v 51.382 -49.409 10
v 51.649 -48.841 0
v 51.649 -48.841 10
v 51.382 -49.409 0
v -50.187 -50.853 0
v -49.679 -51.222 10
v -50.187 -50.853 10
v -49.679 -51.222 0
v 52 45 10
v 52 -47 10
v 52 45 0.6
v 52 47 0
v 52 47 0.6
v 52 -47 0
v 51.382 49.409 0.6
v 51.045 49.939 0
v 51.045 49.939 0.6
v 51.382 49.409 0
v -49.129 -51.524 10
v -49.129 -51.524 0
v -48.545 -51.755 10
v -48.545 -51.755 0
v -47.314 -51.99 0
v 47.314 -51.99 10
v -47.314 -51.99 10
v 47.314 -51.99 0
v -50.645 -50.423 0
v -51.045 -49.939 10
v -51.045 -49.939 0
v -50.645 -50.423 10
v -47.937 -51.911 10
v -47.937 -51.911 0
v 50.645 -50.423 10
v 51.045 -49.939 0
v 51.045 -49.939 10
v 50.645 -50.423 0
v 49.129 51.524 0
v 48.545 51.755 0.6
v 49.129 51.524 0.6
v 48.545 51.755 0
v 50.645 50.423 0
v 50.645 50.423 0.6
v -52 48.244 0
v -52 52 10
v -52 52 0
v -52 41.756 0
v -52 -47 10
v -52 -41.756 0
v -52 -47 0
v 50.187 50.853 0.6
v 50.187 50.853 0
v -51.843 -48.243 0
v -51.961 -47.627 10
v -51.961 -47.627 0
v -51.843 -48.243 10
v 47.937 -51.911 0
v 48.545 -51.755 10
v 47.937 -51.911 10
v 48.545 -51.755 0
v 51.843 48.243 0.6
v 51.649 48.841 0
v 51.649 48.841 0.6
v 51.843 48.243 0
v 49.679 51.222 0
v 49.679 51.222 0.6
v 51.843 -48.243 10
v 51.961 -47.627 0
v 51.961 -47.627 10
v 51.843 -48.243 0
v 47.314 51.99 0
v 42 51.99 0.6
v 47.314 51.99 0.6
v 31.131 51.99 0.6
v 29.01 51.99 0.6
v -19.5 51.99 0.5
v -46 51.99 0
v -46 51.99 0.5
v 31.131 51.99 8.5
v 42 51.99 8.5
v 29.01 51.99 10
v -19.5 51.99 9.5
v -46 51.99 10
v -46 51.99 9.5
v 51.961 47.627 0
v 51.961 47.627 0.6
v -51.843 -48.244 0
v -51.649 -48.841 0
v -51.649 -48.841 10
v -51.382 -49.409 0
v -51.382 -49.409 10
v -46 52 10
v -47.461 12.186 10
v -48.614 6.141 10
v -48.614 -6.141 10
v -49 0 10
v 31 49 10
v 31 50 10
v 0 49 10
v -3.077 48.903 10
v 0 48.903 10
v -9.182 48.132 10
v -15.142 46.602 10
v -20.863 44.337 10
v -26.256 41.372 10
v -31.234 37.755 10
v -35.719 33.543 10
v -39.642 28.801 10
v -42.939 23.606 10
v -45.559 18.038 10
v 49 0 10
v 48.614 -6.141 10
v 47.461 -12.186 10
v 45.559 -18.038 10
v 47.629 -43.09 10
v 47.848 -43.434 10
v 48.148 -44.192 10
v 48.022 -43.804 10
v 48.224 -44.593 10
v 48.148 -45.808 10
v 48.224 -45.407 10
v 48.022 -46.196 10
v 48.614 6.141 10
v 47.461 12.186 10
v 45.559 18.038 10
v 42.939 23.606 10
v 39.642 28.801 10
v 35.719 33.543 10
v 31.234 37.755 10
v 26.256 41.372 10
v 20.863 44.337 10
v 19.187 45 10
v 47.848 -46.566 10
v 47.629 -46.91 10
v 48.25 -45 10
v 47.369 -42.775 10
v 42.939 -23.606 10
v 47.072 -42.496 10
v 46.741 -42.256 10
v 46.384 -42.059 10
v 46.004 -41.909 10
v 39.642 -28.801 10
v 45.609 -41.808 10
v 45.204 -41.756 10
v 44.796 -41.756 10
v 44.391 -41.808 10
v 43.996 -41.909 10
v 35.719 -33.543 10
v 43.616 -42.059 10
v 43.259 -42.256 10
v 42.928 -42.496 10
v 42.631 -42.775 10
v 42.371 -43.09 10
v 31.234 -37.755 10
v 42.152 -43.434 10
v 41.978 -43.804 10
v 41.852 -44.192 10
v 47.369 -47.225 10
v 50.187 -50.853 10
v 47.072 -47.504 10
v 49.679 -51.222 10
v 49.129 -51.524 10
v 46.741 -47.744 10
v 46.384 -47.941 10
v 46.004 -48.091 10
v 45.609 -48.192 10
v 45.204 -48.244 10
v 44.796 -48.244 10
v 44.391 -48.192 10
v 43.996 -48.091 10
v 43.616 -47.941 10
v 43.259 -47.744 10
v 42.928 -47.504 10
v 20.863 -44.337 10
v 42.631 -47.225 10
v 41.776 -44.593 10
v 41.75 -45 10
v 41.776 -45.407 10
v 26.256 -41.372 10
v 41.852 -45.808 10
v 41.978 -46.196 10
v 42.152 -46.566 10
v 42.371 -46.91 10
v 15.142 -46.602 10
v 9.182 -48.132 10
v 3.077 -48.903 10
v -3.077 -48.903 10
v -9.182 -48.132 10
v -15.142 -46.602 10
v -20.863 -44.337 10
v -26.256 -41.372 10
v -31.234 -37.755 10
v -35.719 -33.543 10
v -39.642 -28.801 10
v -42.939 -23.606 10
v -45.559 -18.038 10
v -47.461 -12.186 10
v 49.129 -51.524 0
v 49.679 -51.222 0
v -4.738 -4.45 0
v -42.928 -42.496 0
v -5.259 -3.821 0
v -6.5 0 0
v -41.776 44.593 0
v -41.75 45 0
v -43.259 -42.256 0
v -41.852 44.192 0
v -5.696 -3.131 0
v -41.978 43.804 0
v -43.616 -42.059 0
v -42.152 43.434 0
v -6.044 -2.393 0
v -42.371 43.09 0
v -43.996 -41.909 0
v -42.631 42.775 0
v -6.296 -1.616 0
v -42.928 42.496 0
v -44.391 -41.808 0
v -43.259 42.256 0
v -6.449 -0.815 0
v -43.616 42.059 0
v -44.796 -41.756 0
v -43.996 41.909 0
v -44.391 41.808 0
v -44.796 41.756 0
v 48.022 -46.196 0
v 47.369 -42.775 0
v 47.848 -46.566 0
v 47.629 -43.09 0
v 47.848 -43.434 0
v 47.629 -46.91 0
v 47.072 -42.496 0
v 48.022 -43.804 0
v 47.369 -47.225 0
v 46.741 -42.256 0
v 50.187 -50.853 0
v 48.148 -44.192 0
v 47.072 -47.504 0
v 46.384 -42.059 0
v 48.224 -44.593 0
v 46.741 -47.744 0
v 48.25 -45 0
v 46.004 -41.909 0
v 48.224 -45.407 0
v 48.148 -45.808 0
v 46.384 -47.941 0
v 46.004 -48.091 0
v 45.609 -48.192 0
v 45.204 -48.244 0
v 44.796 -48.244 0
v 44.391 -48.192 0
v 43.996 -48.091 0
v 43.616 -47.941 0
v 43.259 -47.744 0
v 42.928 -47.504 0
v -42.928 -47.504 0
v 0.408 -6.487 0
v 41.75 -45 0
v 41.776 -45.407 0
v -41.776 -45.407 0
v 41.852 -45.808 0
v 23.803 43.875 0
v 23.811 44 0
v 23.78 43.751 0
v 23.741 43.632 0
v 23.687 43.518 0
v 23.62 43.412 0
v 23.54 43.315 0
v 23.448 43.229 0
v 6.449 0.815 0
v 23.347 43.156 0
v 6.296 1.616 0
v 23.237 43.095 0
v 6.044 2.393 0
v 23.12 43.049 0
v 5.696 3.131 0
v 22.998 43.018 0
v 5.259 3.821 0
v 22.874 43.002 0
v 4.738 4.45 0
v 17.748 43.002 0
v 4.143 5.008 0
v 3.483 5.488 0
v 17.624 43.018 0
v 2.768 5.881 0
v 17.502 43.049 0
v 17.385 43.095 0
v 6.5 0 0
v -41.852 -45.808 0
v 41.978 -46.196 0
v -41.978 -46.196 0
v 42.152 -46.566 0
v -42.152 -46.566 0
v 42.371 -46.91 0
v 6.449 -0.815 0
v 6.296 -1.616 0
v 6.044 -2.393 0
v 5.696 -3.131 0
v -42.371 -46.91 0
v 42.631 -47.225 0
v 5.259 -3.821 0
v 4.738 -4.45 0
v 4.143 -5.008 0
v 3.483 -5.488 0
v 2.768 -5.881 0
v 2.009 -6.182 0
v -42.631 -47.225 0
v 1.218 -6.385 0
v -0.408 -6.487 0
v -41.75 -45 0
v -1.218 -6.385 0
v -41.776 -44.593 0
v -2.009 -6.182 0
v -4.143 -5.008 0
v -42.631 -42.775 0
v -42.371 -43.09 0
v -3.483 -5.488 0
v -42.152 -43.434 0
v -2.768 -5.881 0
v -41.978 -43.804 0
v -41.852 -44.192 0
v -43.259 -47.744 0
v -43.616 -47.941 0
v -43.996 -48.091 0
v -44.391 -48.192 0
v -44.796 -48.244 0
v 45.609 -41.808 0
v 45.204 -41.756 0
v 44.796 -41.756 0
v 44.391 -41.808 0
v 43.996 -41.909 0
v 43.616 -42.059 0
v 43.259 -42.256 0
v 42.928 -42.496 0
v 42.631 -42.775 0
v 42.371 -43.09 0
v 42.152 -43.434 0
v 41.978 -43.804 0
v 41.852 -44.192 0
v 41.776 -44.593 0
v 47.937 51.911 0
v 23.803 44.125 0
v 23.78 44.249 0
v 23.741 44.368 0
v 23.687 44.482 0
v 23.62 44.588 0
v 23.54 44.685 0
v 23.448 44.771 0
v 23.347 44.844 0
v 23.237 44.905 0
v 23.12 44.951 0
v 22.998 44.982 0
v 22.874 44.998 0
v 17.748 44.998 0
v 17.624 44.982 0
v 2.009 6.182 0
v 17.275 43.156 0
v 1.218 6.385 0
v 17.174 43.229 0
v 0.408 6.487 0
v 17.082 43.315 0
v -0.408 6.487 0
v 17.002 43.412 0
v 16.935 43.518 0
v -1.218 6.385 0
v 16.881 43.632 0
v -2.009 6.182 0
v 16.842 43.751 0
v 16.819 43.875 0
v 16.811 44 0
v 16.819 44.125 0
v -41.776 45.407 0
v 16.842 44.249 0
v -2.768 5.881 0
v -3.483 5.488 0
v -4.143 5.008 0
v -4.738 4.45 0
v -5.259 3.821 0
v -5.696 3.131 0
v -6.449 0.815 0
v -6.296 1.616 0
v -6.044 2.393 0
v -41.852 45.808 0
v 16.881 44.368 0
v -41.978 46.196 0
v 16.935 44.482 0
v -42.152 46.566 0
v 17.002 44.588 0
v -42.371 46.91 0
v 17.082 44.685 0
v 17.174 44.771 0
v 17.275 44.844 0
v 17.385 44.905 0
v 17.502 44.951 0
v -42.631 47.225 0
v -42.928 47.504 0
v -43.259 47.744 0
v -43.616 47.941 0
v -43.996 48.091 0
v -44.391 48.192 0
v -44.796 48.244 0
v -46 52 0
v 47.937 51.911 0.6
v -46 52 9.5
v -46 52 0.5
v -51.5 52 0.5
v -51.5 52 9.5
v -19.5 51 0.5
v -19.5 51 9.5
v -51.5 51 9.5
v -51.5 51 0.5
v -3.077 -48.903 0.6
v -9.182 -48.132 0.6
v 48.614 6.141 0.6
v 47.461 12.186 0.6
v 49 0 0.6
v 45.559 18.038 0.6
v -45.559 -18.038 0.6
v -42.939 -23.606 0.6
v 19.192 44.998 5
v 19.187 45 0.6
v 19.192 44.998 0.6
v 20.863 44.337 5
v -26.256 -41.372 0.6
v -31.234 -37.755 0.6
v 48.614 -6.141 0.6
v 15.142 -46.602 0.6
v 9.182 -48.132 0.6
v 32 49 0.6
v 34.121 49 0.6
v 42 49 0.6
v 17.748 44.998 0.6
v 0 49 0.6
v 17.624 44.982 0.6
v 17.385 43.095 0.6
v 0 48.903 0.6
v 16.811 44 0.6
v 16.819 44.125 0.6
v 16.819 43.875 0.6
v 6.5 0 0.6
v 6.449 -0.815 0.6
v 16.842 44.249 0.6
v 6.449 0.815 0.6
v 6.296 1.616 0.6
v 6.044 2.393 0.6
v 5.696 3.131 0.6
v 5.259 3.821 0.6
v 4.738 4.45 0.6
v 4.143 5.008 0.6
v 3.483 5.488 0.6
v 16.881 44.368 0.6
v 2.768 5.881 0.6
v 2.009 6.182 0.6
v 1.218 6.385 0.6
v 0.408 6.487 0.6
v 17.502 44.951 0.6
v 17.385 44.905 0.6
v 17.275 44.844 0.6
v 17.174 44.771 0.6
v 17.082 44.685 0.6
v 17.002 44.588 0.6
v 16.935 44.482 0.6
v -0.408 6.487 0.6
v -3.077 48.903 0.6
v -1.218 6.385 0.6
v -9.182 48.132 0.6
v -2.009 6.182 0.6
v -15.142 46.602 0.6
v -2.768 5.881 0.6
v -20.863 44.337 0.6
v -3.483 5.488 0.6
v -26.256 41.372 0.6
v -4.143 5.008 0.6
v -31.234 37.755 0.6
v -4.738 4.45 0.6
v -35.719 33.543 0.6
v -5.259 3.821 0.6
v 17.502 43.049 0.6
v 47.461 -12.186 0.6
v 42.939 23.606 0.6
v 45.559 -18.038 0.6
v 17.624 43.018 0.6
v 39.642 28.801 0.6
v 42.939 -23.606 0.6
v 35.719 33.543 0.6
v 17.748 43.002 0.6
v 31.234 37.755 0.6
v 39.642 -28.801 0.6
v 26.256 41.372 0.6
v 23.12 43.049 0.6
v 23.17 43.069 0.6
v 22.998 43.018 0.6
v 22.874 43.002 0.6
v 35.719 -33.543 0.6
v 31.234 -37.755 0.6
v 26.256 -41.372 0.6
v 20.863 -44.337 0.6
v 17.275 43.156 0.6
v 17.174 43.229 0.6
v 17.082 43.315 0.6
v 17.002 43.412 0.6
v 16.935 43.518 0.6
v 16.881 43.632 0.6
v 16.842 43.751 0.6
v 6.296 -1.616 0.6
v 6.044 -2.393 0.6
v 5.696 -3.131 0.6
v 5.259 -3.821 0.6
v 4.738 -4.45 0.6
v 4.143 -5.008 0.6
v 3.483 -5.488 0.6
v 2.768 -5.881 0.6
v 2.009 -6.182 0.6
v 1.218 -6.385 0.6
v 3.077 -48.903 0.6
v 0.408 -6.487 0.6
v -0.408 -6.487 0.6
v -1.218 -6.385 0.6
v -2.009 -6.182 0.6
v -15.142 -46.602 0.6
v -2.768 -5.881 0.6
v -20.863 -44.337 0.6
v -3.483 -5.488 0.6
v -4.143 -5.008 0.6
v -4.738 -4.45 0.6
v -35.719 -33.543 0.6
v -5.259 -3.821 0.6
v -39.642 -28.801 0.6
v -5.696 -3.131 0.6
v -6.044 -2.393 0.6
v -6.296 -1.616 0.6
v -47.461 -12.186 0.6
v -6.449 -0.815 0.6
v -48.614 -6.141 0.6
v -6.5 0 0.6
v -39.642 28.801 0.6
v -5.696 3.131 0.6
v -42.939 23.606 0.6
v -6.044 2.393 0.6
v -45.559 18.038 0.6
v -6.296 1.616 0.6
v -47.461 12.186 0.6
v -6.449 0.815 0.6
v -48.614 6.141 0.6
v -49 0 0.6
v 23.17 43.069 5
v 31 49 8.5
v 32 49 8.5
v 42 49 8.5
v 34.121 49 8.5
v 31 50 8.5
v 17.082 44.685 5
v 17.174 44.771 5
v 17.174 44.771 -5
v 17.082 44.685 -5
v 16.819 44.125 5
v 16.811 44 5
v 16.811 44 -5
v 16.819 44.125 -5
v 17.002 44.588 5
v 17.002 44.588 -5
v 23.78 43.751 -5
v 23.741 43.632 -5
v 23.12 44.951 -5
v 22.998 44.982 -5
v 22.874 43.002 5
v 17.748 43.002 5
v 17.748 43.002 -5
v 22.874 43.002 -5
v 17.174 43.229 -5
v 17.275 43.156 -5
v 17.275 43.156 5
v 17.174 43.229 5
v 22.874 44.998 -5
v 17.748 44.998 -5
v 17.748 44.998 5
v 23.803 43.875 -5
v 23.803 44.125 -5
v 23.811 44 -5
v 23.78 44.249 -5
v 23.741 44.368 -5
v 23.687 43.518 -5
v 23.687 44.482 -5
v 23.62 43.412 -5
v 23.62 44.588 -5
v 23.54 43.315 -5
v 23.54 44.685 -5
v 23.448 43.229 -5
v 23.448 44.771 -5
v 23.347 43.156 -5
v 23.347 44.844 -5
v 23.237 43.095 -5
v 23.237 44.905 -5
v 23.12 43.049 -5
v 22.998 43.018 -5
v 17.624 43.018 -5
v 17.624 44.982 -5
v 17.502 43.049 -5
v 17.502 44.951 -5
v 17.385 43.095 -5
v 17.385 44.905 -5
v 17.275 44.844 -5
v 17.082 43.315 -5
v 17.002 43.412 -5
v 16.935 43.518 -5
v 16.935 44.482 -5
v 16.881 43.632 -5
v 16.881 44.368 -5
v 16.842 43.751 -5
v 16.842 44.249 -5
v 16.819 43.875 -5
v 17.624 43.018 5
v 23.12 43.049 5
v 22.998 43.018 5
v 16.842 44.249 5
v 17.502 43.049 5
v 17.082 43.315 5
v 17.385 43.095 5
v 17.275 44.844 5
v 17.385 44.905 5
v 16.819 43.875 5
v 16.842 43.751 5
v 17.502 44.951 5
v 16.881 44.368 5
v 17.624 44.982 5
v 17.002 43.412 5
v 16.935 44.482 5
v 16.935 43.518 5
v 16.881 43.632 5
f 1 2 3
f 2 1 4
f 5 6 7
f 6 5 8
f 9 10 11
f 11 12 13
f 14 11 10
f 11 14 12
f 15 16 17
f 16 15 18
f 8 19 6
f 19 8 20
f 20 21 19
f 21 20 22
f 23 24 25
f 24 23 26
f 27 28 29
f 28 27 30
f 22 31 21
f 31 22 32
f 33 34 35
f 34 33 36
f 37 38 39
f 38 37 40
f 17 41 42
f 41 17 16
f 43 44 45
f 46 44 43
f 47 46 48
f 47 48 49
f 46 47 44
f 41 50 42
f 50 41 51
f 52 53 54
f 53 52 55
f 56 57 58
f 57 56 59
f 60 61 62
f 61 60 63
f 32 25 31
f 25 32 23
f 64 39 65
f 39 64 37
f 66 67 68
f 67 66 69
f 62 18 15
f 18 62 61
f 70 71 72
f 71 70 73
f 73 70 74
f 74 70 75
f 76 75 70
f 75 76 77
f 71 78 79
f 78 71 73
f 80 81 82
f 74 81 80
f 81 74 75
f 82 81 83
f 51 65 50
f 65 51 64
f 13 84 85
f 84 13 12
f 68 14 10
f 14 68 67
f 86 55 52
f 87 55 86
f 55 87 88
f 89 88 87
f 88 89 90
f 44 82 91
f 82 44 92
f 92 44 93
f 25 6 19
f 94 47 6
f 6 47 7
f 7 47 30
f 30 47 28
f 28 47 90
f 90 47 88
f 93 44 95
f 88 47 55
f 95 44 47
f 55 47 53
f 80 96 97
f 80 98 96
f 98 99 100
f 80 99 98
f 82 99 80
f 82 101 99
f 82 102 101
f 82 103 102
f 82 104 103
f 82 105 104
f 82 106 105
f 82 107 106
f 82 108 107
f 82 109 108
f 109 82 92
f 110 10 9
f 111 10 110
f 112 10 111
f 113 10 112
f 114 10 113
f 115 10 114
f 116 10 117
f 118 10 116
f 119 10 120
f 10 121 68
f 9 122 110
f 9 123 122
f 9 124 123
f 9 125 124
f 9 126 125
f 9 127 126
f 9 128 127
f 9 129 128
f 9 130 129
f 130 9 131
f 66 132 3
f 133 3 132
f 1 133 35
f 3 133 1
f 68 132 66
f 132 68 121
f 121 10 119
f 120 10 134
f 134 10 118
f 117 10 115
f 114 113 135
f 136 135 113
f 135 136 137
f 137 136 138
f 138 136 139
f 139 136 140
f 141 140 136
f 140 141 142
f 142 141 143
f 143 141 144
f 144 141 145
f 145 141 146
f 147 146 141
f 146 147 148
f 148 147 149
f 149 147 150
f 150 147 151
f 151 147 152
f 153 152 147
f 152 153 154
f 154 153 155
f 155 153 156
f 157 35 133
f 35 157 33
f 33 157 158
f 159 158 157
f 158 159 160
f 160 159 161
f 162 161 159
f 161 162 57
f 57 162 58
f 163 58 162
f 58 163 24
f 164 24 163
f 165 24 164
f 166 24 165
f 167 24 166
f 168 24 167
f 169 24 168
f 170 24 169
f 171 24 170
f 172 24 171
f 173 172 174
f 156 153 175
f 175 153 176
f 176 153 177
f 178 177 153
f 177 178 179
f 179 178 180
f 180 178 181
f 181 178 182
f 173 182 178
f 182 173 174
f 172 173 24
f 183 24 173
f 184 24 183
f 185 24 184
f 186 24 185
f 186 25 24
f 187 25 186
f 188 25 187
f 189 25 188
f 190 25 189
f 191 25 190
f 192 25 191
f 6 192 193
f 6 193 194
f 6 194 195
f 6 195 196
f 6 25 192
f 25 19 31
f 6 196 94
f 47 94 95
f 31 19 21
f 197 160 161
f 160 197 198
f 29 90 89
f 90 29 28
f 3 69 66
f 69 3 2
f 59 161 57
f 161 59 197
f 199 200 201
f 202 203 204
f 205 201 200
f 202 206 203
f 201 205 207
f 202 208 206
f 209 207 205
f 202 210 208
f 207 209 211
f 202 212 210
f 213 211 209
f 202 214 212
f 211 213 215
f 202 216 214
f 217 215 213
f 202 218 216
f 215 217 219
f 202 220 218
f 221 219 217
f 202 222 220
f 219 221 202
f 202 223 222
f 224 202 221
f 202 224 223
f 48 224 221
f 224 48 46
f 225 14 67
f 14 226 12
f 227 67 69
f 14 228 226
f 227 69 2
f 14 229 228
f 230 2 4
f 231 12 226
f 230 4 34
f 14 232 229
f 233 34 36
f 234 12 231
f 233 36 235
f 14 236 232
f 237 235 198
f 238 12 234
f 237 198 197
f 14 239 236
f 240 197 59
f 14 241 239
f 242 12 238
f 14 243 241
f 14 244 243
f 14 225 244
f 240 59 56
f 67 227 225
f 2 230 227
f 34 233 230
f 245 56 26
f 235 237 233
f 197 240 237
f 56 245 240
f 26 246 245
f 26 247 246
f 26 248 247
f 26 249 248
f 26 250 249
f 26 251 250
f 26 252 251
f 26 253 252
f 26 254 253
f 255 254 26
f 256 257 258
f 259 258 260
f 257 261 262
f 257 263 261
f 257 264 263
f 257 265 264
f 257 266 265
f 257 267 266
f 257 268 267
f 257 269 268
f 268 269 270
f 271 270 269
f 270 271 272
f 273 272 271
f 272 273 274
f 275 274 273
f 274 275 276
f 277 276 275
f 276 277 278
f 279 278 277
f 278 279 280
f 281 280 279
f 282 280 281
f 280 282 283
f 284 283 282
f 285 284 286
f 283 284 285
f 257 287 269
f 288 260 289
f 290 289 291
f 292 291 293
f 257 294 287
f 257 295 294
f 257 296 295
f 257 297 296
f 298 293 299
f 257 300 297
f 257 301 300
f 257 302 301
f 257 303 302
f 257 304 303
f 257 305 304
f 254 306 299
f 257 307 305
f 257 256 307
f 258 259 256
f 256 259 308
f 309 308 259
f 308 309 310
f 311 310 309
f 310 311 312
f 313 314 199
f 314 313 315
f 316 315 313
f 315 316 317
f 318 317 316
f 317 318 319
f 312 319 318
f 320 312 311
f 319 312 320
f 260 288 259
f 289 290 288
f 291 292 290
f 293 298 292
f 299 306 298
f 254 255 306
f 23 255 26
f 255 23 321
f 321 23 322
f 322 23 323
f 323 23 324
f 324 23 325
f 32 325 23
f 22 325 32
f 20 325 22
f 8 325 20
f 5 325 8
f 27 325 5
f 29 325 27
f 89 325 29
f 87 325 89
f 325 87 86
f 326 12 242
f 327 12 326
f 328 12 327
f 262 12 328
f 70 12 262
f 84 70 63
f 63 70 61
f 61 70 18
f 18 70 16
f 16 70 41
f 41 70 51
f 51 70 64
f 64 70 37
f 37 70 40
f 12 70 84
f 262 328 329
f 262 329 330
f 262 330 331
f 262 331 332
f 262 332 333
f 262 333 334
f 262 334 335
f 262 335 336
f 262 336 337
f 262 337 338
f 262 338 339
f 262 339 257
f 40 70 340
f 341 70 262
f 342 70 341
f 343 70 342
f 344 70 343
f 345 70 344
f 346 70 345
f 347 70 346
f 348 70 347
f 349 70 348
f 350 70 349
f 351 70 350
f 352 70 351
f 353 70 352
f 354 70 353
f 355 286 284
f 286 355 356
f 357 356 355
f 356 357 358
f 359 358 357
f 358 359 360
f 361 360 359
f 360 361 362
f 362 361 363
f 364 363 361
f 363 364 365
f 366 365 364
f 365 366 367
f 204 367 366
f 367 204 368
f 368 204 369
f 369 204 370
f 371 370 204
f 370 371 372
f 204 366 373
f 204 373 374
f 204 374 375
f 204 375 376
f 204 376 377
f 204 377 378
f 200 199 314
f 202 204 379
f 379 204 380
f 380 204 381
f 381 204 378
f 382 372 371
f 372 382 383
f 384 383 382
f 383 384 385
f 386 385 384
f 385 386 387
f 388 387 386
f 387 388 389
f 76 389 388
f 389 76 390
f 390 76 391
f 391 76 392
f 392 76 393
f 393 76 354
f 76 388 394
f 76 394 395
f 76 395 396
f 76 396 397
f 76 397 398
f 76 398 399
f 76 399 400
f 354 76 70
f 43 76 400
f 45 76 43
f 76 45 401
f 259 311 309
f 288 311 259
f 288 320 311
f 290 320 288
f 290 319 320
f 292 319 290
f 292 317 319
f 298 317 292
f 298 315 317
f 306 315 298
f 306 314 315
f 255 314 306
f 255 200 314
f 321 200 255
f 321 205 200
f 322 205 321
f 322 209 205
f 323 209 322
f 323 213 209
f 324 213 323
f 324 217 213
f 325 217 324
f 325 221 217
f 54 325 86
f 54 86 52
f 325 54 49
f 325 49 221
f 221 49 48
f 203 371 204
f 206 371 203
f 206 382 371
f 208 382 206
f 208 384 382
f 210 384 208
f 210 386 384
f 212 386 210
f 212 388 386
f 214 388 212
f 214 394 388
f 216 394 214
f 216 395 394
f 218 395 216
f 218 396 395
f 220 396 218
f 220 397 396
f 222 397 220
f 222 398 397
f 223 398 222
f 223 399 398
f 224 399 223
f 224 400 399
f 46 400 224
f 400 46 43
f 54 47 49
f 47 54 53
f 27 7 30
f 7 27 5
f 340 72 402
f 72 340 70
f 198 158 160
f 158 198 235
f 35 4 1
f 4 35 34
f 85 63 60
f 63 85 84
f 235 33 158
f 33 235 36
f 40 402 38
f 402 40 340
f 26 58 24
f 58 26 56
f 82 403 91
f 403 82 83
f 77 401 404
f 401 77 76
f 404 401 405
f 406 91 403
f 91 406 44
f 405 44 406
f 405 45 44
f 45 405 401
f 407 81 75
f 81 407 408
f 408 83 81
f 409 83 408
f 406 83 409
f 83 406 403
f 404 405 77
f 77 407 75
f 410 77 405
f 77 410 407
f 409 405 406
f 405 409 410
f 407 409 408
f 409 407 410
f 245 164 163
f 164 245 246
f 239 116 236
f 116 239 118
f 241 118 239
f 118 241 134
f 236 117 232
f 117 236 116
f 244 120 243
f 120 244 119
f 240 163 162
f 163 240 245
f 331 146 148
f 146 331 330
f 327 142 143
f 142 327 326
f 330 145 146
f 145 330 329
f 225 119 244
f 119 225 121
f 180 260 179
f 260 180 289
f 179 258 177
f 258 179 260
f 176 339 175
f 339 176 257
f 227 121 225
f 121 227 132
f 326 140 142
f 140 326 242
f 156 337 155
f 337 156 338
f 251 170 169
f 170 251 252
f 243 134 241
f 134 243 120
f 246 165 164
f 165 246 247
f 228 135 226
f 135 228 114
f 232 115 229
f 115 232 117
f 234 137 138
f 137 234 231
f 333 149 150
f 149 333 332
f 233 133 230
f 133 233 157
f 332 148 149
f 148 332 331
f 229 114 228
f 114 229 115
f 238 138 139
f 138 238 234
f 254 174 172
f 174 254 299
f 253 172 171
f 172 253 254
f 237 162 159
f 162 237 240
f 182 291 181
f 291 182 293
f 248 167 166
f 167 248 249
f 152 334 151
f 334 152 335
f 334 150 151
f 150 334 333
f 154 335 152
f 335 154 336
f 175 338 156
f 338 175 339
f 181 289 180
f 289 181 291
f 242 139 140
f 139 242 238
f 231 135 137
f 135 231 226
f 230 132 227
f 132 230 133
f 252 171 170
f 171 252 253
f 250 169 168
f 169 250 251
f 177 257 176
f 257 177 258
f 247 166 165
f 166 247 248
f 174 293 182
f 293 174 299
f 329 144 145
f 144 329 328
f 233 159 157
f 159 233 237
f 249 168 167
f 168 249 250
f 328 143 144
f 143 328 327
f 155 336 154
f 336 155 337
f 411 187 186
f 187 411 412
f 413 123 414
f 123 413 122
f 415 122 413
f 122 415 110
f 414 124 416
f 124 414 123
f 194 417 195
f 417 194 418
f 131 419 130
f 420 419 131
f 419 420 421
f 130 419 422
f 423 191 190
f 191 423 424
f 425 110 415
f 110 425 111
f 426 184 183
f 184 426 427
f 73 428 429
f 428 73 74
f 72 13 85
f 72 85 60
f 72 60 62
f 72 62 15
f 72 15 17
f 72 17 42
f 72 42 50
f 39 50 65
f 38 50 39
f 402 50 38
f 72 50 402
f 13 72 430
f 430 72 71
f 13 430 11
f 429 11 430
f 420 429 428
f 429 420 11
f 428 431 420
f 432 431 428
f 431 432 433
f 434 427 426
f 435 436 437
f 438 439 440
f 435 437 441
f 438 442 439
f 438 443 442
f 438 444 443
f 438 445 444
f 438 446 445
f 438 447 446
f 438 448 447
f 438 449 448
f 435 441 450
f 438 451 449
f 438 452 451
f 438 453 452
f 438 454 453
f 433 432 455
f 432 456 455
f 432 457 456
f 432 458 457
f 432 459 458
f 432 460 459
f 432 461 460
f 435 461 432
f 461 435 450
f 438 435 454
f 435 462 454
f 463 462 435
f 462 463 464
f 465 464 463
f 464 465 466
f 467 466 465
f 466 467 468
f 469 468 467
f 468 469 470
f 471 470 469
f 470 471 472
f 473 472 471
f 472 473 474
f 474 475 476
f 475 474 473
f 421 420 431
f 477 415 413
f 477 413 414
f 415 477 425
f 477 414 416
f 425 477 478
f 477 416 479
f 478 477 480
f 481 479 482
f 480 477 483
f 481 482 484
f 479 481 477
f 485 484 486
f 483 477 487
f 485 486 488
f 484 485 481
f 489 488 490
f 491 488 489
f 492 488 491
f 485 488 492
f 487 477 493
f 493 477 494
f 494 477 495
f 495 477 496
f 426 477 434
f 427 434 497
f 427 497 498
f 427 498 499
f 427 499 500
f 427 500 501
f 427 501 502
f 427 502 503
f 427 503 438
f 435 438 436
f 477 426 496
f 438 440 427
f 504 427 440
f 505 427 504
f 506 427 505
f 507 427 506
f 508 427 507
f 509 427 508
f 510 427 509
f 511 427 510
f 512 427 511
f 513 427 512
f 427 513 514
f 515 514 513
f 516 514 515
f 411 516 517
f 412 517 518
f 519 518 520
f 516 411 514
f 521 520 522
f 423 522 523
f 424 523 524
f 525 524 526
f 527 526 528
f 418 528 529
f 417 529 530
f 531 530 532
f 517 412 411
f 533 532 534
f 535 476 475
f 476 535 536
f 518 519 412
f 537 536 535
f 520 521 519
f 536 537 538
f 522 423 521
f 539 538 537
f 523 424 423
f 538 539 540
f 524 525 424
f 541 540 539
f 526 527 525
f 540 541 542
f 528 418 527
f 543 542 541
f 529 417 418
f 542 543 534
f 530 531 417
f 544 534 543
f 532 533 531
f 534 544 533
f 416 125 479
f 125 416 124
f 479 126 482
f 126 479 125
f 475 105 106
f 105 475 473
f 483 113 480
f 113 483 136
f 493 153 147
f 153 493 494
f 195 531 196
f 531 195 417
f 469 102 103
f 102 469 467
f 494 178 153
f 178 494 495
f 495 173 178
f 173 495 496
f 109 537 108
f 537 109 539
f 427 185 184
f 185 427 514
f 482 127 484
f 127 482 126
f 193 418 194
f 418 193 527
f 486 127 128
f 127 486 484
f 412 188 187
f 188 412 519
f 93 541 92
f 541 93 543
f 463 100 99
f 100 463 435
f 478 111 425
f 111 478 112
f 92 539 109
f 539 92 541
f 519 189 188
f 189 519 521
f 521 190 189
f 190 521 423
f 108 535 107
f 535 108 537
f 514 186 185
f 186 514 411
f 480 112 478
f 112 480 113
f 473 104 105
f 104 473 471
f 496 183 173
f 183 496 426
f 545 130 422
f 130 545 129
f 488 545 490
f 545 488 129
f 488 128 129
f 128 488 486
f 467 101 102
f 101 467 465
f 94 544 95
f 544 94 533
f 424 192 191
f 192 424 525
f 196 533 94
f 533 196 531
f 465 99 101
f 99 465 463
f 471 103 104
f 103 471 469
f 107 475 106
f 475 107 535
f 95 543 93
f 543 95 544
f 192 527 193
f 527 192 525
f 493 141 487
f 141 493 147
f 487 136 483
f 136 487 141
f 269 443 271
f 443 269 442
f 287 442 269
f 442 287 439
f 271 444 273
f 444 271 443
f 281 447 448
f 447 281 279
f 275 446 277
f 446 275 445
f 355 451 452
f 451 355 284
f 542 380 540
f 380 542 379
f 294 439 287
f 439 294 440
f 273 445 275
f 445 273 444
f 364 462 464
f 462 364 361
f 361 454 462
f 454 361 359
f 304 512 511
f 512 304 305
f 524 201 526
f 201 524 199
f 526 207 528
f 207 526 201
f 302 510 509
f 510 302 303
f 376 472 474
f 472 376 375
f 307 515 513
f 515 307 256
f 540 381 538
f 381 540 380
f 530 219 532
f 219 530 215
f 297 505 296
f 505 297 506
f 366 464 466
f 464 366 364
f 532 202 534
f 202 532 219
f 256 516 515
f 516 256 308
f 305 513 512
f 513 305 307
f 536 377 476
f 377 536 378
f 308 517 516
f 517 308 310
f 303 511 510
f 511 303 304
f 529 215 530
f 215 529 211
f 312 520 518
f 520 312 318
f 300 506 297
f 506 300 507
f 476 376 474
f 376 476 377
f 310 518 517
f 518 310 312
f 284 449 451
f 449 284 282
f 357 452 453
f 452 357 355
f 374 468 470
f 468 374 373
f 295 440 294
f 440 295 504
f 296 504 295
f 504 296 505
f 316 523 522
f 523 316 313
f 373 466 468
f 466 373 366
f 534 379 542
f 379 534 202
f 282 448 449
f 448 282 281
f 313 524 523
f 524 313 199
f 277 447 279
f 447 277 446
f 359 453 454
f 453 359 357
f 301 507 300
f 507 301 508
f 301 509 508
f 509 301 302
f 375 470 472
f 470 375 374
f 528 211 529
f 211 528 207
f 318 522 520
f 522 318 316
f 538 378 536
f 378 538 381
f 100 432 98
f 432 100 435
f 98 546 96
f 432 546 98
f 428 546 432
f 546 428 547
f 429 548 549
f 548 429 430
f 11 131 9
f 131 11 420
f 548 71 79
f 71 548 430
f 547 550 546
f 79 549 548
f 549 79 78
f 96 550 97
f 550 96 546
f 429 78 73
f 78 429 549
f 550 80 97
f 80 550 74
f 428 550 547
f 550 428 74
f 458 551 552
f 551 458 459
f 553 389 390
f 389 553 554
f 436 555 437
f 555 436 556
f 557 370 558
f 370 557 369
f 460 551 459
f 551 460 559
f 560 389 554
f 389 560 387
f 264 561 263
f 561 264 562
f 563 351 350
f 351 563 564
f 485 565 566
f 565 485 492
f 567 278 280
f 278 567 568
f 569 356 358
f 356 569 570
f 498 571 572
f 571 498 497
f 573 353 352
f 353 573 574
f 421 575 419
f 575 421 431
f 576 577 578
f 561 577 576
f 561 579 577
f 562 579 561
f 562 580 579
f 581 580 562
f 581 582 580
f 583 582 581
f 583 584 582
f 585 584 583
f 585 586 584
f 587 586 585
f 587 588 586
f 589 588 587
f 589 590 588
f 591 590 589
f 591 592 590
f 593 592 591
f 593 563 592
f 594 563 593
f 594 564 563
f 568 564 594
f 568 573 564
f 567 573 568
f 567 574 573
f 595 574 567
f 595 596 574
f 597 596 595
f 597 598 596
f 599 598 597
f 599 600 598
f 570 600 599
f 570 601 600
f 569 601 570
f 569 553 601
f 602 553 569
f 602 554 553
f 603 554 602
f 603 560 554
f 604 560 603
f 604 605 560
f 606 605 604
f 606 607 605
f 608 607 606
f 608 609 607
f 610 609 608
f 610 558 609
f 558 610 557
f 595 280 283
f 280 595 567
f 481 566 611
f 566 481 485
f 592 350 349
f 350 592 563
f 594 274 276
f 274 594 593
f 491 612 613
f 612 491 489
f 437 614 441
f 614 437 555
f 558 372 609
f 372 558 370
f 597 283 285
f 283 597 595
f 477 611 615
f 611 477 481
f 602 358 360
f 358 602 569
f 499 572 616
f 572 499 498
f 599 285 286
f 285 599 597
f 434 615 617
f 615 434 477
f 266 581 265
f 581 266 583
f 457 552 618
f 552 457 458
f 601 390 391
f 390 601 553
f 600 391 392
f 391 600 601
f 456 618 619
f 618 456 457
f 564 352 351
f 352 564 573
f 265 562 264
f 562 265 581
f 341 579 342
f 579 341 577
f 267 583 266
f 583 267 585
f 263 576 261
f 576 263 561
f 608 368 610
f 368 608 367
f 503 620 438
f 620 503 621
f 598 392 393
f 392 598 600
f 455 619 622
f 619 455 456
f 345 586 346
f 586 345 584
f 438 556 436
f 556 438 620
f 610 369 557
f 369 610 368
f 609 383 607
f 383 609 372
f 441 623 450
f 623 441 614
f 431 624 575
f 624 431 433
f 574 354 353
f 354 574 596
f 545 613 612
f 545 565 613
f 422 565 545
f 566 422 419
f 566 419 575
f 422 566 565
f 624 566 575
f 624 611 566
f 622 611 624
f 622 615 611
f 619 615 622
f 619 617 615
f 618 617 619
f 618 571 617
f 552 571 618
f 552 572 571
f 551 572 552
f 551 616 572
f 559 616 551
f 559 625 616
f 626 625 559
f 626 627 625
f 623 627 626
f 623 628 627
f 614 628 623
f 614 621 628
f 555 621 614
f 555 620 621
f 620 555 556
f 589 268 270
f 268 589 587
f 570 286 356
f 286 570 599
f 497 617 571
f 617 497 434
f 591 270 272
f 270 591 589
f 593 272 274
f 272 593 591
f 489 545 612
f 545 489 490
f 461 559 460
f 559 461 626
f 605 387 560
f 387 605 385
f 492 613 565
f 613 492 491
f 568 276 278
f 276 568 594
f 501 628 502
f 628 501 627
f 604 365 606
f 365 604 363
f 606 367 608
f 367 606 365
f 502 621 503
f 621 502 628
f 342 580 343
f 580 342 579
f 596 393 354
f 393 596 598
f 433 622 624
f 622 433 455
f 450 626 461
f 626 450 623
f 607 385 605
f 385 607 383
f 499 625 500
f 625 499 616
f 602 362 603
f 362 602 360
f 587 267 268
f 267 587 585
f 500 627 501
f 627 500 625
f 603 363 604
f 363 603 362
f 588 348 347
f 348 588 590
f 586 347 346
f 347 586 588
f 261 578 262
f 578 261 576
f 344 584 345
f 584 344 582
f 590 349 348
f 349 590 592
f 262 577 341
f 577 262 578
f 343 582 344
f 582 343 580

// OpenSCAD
$fn = 50;


union() {
	difference() {
		union() {
			hull() {
				translate(v = [-47.0000000000, 47.0000000000, 0]) {
					cylinder(h = 10, r = 5);
				}
				translate(v = [47.0000000000, 47.0000000000, 0]) {
					cylinder(h = 10, r = 5);
				}
				translate(v = [-47.0000000000, -47.0000000000, 0]) {
					cylinder(h = 10, r = 5);
				}
				translate(v = [47.0000000000, -47.0000000000, 0]) {
					cylinder(h = 10, r = 5);
				}
			}
			translate(v = [-52.0000000000, 46.0000000000, 0]) {
				cube(size = [6, 6, 10]);
			}
		}
		union() {
			translate(v = [-52.5000000000, -45.0000000000, -250.0000000000]) {
				rotate(a = [0, 0, 0]) {
					difference() {
						union() {
							hull() {
								translate(v = [7.5000000000, 0, 0]) {
									cylinder(h = 250, r = 3.2500000000, r1 = 3.2500000000, r2 = 3.2500000000);
								}
								translate(v = [-7.5000000000, 0, 0]) {
									cylinder(h = 250, r = 3.2500000000, r1 = 3.2500000000, r2 = 3.2500000000);
								}
							}
						}
						union();
					}
				}
			}
			translate(v = [-52.5000000000, 45.0000000000, -250.0000000000]) {
				rotate(a = [0, 0, 0]) {
					difference() {
						union() {
							hull() {
								translate(v = [7.5000000000, 0, 0]) {
									cylinder(h = 250, r = 3.2500000000, r1 = 3.2500000000, r2 = 3.2500000000);
								}
								translate(v = [-7.5000000000, 0, 0]) {
									cylinder(h = 250, r = 3.2500000000, r1 = 3.2500000000, r2 = 3.2500000000);
								}
							}
						}
						union();
					}
				}
			}
			translate(v = [-51.5000000000, 51.0000000000, 0.5000000000]) {
				cube(size = [32, 1, 9.0000000000]);
			}
			translate(v = [45.0000000000, -45.0000000000, 0]) {
				cylinder(h = 100, r = 3.2500000000);
			}
			translate(v = [0, 0, 0.6000000000]) {
				cylinder(h = 12.4000000000, r = 49.0000000000);
			}
			translate(v = [0, 0, -5.0000000000]) {
				cylinder(h = 10, r = 6.5000000000);
			}
			translate(v = [0.0000000000, 45.0000000000, 0.6000000000]) {
				cube(size = [52.0000000000, 4, 12.4000000000]);
			}
			translate(v = [42.0000000000, 45.0000000000, 0.6000000000]) {
				cube(size = [10, 7, 12.4000000000]);
			}
			translate(v = [31.0000000000, 45.0000000000, 8.5000000000]) {
				cube(size = [21, 7, 1.5000000000]);
			}
			translate(v = [28.2500000000, 52.7500000000, 0.6000000000]) {
				rotate(a = [0, 0, -45]) {
					cube(size = [7.5000000000, 1.5000000000, 12.4000000000]);
				}
			}
			translate(v = [11.0610000000, 43.0000000000, 0.6000000000]) {
				cube(size = [7.5000000000, 2, 9.4000000000]);
			}
		}
	}
	union() {
		translate(v = [20.3110000000, 44.0000000000, -5.0000000000]) {
			rotate(a = [0, 0, 0]) {
				difference() {
					union() {
						#hull() {
							#translate(v = [2.5000000000, 0, 0]) {
								cylinder(h = 10, r = 1.0000000000, r1 = 1.0000000000, r2 = 1.0000000000);
							}
							#translate(v = [-2.5000000000, 0, 0]) {
								cylinder(h = 10, r = 1.0000000000, r1 = 1.0000000000, r2 = 1.0000000000);
							}
						}
					}
					union();
				}
			}
		}
	}
}
